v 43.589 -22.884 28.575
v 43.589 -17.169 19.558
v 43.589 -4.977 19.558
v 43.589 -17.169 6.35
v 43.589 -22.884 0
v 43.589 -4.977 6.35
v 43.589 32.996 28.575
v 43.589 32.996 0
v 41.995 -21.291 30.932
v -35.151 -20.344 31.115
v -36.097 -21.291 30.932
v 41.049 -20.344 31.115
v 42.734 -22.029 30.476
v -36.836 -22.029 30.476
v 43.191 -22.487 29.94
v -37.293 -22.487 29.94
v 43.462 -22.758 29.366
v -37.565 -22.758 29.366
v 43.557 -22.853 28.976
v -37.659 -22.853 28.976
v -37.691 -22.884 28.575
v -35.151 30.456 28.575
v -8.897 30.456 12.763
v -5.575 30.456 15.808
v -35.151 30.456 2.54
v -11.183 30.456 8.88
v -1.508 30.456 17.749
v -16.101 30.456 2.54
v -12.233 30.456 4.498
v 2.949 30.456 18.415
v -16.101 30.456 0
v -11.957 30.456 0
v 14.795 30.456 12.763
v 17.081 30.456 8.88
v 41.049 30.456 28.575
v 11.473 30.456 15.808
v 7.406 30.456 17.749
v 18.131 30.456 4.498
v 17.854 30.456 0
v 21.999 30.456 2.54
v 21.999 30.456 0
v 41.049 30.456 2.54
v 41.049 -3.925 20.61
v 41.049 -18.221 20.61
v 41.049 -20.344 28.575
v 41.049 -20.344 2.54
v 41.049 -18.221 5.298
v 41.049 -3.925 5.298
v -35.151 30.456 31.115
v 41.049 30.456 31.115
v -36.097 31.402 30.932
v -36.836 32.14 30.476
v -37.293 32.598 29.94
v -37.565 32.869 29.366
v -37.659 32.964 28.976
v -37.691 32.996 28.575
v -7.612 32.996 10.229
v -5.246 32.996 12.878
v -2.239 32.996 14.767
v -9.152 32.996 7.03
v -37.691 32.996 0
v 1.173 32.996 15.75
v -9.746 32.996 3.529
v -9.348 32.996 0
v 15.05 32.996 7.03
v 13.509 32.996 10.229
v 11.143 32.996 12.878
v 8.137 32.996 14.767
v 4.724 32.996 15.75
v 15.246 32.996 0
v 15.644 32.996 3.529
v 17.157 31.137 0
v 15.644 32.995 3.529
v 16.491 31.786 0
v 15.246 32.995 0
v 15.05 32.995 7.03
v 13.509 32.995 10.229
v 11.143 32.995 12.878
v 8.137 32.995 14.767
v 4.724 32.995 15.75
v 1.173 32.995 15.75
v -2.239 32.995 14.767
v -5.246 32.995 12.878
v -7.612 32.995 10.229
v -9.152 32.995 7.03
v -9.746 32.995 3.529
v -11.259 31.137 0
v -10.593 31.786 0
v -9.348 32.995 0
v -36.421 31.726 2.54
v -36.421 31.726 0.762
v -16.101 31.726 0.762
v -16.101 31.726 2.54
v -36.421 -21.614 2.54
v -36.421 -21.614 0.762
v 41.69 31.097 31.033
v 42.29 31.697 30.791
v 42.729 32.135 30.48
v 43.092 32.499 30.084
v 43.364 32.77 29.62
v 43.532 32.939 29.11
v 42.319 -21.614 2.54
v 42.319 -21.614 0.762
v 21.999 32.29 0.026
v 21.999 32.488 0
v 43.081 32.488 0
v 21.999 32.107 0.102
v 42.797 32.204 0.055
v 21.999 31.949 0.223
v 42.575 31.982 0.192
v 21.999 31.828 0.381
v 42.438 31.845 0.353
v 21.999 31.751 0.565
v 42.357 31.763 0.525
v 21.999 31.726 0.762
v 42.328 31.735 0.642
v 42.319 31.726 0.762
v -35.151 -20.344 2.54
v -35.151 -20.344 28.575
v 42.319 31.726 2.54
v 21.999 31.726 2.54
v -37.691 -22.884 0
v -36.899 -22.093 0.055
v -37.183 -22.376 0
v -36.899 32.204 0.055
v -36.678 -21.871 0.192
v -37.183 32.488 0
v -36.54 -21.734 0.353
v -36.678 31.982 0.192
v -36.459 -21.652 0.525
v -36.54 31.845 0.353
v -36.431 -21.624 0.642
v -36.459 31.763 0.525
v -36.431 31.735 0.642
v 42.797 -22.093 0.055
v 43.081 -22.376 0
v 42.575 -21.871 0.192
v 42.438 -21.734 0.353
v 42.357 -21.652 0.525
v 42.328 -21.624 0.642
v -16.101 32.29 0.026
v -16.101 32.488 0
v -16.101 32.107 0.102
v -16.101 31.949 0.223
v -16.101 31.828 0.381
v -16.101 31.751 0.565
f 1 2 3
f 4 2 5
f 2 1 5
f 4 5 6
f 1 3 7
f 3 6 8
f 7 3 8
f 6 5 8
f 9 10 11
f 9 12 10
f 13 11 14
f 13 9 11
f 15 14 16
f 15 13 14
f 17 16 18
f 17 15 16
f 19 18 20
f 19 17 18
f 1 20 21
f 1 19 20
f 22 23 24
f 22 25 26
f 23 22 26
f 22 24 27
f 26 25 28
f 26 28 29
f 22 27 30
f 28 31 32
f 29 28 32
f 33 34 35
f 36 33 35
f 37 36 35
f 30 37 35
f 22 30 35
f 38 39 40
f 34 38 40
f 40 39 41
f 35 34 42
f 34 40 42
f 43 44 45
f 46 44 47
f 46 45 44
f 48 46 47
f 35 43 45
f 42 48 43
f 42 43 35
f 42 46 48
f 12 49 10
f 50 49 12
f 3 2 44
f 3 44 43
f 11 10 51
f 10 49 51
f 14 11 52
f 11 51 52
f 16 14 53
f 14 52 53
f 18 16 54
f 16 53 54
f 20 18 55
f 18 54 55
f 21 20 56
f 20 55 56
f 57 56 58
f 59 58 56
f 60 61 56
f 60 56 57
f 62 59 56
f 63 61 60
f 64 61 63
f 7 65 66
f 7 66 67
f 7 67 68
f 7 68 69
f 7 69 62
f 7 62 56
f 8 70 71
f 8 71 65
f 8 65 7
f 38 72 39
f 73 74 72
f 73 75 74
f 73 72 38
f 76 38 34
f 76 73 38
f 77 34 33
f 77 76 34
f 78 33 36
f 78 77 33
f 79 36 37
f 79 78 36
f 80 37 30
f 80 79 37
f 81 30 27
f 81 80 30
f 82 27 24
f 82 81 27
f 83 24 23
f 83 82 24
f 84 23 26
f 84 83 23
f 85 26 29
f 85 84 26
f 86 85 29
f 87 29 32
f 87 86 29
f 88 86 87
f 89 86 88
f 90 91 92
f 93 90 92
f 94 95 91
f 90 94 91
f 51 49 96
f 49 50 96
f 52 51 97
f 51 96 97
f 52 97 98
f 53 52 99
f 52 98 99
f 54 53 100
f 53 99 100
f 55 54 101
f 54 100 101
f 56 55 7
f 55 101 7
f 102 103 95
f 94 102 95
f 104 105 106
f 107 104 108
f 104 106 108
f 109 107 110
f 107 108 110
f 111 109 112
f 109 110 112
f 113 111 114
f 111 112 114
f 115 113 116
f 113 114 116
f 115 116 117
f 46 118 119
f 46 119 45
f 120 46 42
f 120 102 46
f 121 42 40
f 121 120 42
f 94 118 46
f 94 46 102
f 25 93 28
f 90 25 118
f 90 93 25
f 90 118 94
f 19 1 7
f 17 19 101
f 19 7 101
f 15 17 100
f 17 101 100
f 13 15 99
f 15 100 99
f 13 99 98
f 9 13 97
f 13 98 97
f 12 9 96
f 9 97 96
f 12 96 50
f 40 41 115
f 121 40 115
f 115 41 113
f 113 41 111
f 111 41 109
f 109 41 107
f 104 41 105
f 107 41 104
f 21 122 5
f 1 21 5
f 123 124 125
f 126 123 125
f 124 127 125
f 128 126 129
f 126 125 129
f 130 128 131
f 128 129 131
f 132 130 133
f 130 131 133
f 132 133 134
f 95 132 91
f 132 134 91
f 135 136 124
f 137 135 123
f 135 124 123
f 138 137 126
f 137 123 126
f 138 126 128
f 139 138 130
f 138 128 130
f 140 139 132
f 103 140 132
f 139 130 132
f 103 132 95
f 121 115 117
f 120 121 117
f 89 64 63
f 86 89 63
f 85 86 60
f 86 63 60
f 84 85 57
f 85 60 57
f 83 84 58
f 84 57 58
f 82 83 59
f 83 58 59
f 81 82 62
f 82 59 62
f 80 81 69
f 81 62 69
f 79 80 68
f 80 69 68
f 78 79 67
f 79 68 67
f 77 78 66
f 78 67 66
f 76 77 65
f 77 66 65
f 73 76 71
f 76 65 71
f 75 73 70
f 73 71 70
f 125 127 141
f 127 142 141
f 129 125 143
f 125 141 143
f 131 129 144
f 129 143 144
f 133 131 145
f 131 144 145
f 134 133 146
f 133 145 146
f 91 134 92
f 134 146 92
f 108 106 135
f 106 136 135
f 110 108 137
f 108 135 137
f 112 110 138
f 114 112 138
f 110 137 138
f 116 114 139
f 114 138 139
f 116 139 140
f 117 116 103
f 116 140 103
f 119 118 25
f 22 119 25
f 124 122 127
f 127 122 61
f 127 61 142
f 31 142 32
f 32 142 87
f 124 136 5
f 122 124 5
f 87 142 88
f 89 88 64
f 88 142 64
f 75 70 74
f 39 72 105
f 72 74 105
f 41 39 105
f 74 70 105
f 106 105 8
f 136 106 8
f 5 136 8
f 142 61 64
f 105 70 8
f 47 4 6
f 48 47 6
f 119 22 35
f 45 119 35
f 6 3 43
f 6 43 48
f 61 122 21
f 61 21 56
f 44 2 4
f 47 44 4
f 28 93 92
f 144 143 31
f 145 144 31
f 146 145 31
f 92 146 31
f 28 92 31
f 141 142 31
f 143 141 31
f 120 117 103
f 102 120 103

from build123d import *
from OCP.BRepFilletAPI import BRepFilletAPI_MakeChamfer

# Parameters (mm, degrees)
SKETCH1_W           = 81.28
SKETCH1_H           = 55.88
SKETCH1_W_2         = 76.2
SKETCH1_H_2         = 50.8
BOSS_EXTRUDE1_DEPTH = 28.575
SKETCH2_W           = 81.28
SKETCH2_H           = 55.88
BOSS_EXTRUDE2_DEPTH = 2.54
SKETCH5_W           = 13.208
SKETCH5_H           = 12.192
CUT_EXTRUDE1_DEPTH  = 2.54
SKETCH6_R           = 12.7
CUT_EXTRUDE2_DEPTH  = 2.54
CHAMFER4_SIZE       = 1.052102448
CHAMFER4_SIZE_2     = 2.54
CUT_EXTRUDE3_DEPTH  = 2.54
CHAMFER5_SIZE       = 2.54
FILLET2_R           = 0.762
FILLET3_R           = 2.54


with BuildPart() as part:
    # Sketch1 → Boss-Extrude1 (new body)
    with BuildSketch(Plane.XY):
        with Locations((2.94888724, 5.055504451)):
            Rectangle(SKETCH1_W, SKETCH1_H)
        with Locations((2.94888724, 5.055504451)):
            Rectangle(SKETCH1_W_2, SKETCH1_H_2, mode=Mode.SUBTRACT)
    extrude(amount=BOSS_EXTRUDE1_DEPTH)

    # Sketch2 → Boss-Extrude2 (add)
    with BuildSketch(Plane.XY.offset(28.575)):
        with Locations((2.94888724, 5.055504451)):
            Rectangle(SKETCH2_W, SKETCH2_H)
    extrude(amount=BOSS_EXTRUDE2_DEPTH)

    # Sketch5 → Cut-Extrude1 (cut)
    with BuildSketch(Plane(origin=(43.58888724, 0, 0), x_dir=(0, 0, -1), z_dir=(1, 0, 0))):
        with Locations((-12.954, -11.073495549)):
            Rectangle(SKETCH5_W, SKETCH5_H)
    extrude(amount=-CUT_EXTRUDE1_DEPTH, mode=Mode.SUBTRACT)

    # Sketch6 → Cut-Extrude2 (cut)
    with BuildSketch(Plane(origin=(0, 32.995504451, 0), x_dir=(1, 0, 0), z_dir=(0, 1, 0))):
        with Locations((2.94888724, -3.175)):
            Circle(SKETCH6_R)
    extrude(amount=-CUT_EXTRUDE2_DEPTH, mode=Mode.SUBTRACT)

    # Chamfer4
    chamfer4_edges_1 = [part.edges().sort_by_distance(p)[0] for p in [
        (41.04888724, -17.169495549, 12.954),
    ]]
    chamfer4_side_1 = [part.faces().sort_by_distance(p)[0] for p in [
        (41.04888724, -17.190537598, 12.954),
    ]]
    chamfer4_edges_2 = [part.edges().sort_by_distance(p)[0] for p in [
        (41.04888724, -11.073495549, 19.558),
    ]]
    chamfer4_side_2 = [part.faces().sort_by_distance(p)[0] for p in [
        (41.04888724, -11.073495549, 19.579042049),
    ]]
    chamfer4_edges_3 = [part.edges().sort_by_distance(p)[0] for p in [
        (41.04888724, -4.977495549, 12.954),
    ]]
    chamfer4_side_3 = [part.faces().sort_by_distance(p)[0] for p in [
        (41.04888724, -4.9564535, 12.954),
    ]]
    chamfer4_edges_4 = [part.edges().sort_by_distance(p)[0] for p in [
        (41.04888724, -11.073495549, 6.35),
    ]]
    chamfer4_side_4 = [part.faces().sort_by_distance(p)[0] for p in [
        (41.04888724, -11.073495549, 6.328957951),
    ]]
    chamfer4 = BRepFilletAPI_MakeChamfer(part.part.solid().wrapped)
    for e in chamfer4_edges_1:
        chamfer4.Add(CHAMFER4_SIZE - 0.0001, CHAMFER4_SIZE_2 - 0.0001, e.wrapped, chamfer4_side_1[0].wrapped)
    for e in chamfer4_edges_2:
        chamfer4.Add(CHAMFER4_SIZE - 0.0001, CHAMFER4_SIZE_2 - 0.0001, e.wrapped, chamfer4_side_2[0].wrapped)
    for e in chamfer4_edges_3:
        chamfer4.Add(CHAMFER4_SIZE - 0.0001, CHAMFER4_SIZE_2 - 0.0001, e.wrapped, chamfer4_side_3[0].wrapped)
    for e in chamfer4_edges_4:
        chamfer4.Add(CHAMFER4_SIZE - 0.0001, CHAMFER4_SIZE_2 - 0.0001, e.wrapped, chamfer4_side_4[0].wrapped)
    add(Compound.cast(chamfer4.Shape()), mode=Mode.REPLACE)  # a hair under: the kernel refuses the full size

    # Sketch8 → Cut-Extrude3 (cut)
    with BuildSketch(Plane(origin=(0, 0, 0), x_dir=(-1, 0, 0), z_dir=(0, 0, -1))):
        Polygon((-41.04888724, 30.455504451), (-21.99888724, 30.455504451), (-21.99888724, 31.725504451), (-42.31888724, 31.725504451), (-42.31888724, -21.614495549), (36.42111276, -21.614495549), (36.42111276, 31.725504451), (16.10111276, 31.725504451), (16.10111276, 30.455504451), (35.15111276, 30.455504451), (35.15111276, -20.344495549), (-41.04888724, -20.344495549), align=None)
    extrude(amount=-CUT_EXTRUDE3_DEPTH, mode=Mode.SUBTRACT)

    # Chamfer5
    chamfer5_edges = [part.edges().sort_by_distance(p)[0] for p in [
        (2.94888724, 30.455504451, 15.875),
    ]]
    chamfer(chamfer5_edges, length=CHAMFER5_SIZE - 0.0001)  # a hair under: the kernel refuses the full size

    # Fillet2
    fillet2_edges = [part.edges().sort_by_distance(p)[0] for p in [
        (32.15888724, 31.725504451, 0),
        (42.31888724, 5.055504451, 0),
        (2.94888724, -21.614495549, 0),
        (-36.42111276, 5.055504451, 0),
        (-26.26111276, 31.725504451, 0),
    ]]
    fillet(fillet2_edges, radius=FILLET2_R)

    # Fillet3
    fillet3_edges = [part.edges().sort_by_distance(p)[0] for p in [
        (-37.69111276, 5.055504451, 31.115),
        (2.94888724, -22.884495549, 31.115),
        (43.58888724, 5.055504451, 31.115),
        (2.94888724, 32.995504451, 31.115),
    ]]
    fillet(fillet3_edges, radius=FILLET3_R)


solid = part.part
